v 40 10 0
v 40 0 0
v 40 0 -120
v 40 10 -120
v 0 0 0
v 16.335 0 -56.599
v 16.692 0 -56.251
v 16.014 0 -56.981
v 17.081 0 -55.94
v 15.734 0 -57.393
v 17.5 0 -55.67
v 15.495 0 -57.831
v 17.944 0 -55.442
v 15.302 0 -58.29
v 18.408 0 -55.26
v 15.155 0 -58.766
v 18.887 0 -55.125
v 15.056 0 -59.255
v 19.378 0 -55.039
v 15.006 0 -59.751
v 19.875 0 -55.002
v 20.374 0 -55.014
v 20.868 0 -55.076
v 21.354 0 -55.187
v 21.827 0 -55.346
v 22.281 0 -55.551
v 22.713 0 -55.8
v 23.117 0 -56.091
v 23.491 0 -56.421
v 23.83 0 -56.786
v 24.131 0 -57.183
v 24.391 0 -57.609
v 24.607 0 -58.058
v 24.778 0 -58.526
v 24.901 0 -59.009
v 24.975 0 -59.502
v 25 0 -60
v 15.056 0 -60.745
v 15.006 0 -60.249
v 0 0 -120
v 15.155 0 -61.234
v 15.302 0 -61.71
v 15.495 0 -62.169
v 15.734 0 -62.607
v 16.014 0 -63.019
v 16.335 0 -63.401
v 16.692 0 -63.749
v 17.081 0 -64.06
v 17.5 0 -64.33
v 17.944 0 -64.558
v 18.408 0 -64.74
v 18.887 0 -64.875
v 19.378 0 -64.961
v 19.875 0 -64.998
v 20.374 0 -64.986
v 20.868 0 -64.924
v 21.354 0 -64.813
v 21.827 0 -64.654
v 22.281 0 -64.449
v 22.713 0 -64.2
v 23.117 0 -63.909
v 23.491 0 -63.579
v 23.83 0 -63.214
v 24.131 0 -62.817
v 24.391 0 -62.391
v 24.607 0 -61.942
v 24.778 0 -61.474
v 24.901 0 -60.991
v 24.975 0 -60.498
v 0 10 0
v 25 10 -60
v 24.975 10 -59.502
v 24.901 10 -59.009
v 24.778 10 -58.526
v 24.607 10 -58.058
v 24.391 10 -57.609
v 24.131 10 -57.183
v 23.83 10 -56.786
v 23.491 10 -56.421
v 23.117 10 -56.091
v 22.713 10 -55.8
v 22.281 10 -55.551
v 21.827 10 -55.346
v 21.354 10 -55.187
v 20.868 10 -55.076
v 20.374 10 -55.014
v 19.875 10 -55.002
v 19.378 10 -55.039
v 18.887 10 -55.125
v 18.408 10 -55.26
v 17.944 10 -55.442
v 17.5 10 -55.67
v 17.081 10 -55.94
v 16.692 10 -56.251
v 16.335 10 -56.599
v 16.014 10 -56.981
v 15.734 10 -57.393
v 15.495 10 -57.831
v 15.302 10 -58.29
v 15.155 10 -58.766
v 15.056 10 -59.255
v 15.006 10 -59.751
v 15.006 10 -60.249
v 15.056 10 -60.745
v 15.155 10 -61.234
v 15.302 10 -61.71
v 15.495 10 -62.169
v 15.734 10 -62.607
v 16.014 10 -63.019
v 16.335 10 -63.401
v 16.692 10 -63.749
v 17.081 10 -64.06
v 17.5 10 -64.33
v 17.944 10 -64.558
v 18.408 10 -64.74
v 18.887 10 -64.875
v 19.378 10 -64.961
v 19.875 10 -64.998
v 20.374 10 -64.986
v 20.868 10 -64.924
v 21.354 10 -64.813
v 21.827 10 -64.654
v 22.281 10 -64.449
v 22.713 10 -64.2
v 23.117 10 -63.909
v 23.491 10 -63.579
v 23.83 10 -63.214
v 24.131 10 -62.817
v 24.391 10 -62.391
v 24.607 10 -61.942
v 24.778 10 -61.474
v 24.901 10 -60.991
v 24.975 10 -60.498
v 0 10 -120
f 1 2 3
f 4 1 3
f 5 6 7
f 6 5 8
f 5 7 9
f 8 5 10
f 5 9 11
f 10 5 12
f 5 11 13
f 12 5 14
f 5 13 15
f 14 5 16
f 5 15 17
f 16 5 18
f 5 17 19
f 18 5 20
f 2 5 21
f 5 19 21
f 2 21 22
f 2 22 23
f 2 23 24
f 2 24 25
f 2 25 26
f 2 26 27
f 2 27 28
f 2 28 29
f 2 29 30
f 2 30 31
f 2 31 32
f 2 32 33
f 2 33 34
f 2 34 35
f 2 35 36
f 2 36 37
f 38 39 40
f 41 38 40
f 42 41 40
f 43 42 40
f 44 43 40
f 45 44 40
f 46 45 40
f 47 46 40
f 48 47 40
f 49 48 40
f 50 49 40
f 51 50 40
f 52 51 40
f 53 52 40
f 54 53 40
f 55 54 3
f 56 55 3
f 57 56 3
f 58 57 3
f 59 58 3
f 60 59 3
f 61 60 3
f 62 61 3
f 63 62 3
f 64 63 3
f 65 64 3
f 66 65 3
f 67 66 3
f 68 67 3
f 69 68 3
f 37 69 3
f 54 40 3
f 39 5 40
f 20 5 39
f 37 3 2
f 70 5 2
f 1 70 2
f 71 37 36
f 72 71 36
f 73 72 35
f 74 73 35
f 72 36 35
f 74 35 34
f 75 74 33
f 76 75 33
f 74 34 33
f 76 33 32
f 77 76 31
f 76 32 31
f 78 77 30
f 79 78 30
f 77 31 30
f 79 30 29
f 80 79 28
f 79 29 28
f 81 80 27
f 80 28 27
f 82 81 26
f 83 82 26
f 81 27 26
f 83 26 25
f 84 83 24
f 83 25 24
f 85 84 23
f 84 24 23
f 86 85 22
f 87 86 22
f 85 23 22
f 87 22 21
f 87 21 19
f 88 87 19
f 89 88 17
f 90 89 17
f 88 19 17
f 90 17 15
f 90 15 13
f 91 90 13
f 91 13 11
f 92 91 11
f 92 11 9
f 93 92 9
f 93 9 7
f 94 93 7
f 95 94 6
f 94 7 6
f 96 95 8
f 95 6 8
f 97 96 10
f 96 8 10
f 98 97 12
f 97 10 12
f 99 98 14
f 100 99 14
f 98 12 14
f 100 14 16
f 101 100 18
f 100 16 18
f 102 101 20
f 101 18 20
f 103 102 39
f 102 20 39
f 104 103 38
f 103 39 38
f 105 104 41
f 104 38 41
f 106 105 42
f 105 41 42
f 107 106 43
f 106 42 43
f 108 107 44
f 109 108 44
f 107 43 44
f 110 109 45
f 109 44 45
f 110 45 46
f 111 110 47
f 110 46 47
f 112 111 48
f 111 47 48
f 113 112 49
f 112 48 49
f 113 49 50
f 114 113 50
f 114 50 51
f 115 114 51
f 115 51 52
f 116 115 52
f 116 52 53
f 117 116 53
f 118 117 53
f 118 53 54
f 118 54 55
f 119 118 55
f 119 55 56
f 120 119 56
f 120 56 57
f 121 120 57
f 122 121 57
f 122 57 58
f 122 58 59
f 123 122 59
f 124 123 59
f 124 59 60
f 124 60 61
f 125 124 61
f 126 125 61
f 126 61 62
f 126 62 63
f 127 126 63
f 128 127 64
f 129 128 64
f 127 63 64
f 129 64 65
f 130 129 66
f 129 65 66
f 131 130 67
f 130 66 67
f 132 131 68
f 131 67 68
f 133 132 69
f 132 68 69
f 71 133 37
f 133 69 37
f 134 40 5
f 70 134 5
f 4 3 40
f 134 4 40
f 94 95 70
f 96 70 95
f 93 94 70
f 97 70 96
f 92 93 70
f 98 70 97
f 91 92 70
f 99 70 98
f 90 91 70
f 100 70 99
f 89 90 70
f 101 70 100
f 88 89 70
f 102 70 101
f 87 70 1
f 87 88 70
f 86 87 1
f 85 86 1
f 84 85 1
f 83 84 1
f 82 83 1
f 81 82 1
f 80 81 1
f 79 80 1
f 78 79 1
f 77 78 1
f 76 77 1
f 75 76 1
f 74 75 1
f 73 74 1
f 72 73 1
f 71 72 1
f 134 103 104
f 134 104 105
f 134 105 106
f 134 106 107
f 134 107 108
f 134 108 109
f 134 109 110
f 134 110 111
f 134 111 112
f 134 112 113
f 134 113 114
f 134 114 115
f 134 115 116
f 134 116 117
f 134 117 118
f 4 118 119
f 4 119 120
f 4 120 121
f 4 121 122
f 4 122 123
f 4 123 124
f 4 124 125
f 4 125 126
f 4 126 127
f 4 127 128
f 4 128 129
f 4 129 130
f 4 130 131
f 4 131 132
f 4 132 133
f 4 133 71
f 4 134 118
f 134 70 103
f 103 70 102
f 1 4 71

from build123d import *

# Parameters (mm, degrees)
BOSS_EXTRUDE1_DEPTH = 10


with BuildPart() as part:
    # Sketch1 → Boss-Extrude1 (new body)
    with BuildSketch(Plane(origin=(0, 0, 0), x_dir=(1, 0, 0), z_dir=(0, 1, 0))):
        with BuildLine():
            Line((0, 120), (0, 60))
            Line((0, 60), (15, 60))
            ThreePointArc((15, 60), (20, 65), (25, 60))
            Line((25, 60), (40, 60))
            Line((40, 60), (40, 120))
            Line((40, 120), (0, 120))
        make_face()
        with BuildLine():
            Line((0, 60), (0, 0))
            Line((0, 0), (40, 0))
            Line((40, 0), (40, 60))
            Line((40, 60), (25, 60))
            ThreePointArc((25, 60), (20, 55), (15, 60))
            Line((15, 60), (0, 60))
        make_face()
    extrude(amount=BOSS_EXTRUDE1_DEPTH)


solid = part.part
